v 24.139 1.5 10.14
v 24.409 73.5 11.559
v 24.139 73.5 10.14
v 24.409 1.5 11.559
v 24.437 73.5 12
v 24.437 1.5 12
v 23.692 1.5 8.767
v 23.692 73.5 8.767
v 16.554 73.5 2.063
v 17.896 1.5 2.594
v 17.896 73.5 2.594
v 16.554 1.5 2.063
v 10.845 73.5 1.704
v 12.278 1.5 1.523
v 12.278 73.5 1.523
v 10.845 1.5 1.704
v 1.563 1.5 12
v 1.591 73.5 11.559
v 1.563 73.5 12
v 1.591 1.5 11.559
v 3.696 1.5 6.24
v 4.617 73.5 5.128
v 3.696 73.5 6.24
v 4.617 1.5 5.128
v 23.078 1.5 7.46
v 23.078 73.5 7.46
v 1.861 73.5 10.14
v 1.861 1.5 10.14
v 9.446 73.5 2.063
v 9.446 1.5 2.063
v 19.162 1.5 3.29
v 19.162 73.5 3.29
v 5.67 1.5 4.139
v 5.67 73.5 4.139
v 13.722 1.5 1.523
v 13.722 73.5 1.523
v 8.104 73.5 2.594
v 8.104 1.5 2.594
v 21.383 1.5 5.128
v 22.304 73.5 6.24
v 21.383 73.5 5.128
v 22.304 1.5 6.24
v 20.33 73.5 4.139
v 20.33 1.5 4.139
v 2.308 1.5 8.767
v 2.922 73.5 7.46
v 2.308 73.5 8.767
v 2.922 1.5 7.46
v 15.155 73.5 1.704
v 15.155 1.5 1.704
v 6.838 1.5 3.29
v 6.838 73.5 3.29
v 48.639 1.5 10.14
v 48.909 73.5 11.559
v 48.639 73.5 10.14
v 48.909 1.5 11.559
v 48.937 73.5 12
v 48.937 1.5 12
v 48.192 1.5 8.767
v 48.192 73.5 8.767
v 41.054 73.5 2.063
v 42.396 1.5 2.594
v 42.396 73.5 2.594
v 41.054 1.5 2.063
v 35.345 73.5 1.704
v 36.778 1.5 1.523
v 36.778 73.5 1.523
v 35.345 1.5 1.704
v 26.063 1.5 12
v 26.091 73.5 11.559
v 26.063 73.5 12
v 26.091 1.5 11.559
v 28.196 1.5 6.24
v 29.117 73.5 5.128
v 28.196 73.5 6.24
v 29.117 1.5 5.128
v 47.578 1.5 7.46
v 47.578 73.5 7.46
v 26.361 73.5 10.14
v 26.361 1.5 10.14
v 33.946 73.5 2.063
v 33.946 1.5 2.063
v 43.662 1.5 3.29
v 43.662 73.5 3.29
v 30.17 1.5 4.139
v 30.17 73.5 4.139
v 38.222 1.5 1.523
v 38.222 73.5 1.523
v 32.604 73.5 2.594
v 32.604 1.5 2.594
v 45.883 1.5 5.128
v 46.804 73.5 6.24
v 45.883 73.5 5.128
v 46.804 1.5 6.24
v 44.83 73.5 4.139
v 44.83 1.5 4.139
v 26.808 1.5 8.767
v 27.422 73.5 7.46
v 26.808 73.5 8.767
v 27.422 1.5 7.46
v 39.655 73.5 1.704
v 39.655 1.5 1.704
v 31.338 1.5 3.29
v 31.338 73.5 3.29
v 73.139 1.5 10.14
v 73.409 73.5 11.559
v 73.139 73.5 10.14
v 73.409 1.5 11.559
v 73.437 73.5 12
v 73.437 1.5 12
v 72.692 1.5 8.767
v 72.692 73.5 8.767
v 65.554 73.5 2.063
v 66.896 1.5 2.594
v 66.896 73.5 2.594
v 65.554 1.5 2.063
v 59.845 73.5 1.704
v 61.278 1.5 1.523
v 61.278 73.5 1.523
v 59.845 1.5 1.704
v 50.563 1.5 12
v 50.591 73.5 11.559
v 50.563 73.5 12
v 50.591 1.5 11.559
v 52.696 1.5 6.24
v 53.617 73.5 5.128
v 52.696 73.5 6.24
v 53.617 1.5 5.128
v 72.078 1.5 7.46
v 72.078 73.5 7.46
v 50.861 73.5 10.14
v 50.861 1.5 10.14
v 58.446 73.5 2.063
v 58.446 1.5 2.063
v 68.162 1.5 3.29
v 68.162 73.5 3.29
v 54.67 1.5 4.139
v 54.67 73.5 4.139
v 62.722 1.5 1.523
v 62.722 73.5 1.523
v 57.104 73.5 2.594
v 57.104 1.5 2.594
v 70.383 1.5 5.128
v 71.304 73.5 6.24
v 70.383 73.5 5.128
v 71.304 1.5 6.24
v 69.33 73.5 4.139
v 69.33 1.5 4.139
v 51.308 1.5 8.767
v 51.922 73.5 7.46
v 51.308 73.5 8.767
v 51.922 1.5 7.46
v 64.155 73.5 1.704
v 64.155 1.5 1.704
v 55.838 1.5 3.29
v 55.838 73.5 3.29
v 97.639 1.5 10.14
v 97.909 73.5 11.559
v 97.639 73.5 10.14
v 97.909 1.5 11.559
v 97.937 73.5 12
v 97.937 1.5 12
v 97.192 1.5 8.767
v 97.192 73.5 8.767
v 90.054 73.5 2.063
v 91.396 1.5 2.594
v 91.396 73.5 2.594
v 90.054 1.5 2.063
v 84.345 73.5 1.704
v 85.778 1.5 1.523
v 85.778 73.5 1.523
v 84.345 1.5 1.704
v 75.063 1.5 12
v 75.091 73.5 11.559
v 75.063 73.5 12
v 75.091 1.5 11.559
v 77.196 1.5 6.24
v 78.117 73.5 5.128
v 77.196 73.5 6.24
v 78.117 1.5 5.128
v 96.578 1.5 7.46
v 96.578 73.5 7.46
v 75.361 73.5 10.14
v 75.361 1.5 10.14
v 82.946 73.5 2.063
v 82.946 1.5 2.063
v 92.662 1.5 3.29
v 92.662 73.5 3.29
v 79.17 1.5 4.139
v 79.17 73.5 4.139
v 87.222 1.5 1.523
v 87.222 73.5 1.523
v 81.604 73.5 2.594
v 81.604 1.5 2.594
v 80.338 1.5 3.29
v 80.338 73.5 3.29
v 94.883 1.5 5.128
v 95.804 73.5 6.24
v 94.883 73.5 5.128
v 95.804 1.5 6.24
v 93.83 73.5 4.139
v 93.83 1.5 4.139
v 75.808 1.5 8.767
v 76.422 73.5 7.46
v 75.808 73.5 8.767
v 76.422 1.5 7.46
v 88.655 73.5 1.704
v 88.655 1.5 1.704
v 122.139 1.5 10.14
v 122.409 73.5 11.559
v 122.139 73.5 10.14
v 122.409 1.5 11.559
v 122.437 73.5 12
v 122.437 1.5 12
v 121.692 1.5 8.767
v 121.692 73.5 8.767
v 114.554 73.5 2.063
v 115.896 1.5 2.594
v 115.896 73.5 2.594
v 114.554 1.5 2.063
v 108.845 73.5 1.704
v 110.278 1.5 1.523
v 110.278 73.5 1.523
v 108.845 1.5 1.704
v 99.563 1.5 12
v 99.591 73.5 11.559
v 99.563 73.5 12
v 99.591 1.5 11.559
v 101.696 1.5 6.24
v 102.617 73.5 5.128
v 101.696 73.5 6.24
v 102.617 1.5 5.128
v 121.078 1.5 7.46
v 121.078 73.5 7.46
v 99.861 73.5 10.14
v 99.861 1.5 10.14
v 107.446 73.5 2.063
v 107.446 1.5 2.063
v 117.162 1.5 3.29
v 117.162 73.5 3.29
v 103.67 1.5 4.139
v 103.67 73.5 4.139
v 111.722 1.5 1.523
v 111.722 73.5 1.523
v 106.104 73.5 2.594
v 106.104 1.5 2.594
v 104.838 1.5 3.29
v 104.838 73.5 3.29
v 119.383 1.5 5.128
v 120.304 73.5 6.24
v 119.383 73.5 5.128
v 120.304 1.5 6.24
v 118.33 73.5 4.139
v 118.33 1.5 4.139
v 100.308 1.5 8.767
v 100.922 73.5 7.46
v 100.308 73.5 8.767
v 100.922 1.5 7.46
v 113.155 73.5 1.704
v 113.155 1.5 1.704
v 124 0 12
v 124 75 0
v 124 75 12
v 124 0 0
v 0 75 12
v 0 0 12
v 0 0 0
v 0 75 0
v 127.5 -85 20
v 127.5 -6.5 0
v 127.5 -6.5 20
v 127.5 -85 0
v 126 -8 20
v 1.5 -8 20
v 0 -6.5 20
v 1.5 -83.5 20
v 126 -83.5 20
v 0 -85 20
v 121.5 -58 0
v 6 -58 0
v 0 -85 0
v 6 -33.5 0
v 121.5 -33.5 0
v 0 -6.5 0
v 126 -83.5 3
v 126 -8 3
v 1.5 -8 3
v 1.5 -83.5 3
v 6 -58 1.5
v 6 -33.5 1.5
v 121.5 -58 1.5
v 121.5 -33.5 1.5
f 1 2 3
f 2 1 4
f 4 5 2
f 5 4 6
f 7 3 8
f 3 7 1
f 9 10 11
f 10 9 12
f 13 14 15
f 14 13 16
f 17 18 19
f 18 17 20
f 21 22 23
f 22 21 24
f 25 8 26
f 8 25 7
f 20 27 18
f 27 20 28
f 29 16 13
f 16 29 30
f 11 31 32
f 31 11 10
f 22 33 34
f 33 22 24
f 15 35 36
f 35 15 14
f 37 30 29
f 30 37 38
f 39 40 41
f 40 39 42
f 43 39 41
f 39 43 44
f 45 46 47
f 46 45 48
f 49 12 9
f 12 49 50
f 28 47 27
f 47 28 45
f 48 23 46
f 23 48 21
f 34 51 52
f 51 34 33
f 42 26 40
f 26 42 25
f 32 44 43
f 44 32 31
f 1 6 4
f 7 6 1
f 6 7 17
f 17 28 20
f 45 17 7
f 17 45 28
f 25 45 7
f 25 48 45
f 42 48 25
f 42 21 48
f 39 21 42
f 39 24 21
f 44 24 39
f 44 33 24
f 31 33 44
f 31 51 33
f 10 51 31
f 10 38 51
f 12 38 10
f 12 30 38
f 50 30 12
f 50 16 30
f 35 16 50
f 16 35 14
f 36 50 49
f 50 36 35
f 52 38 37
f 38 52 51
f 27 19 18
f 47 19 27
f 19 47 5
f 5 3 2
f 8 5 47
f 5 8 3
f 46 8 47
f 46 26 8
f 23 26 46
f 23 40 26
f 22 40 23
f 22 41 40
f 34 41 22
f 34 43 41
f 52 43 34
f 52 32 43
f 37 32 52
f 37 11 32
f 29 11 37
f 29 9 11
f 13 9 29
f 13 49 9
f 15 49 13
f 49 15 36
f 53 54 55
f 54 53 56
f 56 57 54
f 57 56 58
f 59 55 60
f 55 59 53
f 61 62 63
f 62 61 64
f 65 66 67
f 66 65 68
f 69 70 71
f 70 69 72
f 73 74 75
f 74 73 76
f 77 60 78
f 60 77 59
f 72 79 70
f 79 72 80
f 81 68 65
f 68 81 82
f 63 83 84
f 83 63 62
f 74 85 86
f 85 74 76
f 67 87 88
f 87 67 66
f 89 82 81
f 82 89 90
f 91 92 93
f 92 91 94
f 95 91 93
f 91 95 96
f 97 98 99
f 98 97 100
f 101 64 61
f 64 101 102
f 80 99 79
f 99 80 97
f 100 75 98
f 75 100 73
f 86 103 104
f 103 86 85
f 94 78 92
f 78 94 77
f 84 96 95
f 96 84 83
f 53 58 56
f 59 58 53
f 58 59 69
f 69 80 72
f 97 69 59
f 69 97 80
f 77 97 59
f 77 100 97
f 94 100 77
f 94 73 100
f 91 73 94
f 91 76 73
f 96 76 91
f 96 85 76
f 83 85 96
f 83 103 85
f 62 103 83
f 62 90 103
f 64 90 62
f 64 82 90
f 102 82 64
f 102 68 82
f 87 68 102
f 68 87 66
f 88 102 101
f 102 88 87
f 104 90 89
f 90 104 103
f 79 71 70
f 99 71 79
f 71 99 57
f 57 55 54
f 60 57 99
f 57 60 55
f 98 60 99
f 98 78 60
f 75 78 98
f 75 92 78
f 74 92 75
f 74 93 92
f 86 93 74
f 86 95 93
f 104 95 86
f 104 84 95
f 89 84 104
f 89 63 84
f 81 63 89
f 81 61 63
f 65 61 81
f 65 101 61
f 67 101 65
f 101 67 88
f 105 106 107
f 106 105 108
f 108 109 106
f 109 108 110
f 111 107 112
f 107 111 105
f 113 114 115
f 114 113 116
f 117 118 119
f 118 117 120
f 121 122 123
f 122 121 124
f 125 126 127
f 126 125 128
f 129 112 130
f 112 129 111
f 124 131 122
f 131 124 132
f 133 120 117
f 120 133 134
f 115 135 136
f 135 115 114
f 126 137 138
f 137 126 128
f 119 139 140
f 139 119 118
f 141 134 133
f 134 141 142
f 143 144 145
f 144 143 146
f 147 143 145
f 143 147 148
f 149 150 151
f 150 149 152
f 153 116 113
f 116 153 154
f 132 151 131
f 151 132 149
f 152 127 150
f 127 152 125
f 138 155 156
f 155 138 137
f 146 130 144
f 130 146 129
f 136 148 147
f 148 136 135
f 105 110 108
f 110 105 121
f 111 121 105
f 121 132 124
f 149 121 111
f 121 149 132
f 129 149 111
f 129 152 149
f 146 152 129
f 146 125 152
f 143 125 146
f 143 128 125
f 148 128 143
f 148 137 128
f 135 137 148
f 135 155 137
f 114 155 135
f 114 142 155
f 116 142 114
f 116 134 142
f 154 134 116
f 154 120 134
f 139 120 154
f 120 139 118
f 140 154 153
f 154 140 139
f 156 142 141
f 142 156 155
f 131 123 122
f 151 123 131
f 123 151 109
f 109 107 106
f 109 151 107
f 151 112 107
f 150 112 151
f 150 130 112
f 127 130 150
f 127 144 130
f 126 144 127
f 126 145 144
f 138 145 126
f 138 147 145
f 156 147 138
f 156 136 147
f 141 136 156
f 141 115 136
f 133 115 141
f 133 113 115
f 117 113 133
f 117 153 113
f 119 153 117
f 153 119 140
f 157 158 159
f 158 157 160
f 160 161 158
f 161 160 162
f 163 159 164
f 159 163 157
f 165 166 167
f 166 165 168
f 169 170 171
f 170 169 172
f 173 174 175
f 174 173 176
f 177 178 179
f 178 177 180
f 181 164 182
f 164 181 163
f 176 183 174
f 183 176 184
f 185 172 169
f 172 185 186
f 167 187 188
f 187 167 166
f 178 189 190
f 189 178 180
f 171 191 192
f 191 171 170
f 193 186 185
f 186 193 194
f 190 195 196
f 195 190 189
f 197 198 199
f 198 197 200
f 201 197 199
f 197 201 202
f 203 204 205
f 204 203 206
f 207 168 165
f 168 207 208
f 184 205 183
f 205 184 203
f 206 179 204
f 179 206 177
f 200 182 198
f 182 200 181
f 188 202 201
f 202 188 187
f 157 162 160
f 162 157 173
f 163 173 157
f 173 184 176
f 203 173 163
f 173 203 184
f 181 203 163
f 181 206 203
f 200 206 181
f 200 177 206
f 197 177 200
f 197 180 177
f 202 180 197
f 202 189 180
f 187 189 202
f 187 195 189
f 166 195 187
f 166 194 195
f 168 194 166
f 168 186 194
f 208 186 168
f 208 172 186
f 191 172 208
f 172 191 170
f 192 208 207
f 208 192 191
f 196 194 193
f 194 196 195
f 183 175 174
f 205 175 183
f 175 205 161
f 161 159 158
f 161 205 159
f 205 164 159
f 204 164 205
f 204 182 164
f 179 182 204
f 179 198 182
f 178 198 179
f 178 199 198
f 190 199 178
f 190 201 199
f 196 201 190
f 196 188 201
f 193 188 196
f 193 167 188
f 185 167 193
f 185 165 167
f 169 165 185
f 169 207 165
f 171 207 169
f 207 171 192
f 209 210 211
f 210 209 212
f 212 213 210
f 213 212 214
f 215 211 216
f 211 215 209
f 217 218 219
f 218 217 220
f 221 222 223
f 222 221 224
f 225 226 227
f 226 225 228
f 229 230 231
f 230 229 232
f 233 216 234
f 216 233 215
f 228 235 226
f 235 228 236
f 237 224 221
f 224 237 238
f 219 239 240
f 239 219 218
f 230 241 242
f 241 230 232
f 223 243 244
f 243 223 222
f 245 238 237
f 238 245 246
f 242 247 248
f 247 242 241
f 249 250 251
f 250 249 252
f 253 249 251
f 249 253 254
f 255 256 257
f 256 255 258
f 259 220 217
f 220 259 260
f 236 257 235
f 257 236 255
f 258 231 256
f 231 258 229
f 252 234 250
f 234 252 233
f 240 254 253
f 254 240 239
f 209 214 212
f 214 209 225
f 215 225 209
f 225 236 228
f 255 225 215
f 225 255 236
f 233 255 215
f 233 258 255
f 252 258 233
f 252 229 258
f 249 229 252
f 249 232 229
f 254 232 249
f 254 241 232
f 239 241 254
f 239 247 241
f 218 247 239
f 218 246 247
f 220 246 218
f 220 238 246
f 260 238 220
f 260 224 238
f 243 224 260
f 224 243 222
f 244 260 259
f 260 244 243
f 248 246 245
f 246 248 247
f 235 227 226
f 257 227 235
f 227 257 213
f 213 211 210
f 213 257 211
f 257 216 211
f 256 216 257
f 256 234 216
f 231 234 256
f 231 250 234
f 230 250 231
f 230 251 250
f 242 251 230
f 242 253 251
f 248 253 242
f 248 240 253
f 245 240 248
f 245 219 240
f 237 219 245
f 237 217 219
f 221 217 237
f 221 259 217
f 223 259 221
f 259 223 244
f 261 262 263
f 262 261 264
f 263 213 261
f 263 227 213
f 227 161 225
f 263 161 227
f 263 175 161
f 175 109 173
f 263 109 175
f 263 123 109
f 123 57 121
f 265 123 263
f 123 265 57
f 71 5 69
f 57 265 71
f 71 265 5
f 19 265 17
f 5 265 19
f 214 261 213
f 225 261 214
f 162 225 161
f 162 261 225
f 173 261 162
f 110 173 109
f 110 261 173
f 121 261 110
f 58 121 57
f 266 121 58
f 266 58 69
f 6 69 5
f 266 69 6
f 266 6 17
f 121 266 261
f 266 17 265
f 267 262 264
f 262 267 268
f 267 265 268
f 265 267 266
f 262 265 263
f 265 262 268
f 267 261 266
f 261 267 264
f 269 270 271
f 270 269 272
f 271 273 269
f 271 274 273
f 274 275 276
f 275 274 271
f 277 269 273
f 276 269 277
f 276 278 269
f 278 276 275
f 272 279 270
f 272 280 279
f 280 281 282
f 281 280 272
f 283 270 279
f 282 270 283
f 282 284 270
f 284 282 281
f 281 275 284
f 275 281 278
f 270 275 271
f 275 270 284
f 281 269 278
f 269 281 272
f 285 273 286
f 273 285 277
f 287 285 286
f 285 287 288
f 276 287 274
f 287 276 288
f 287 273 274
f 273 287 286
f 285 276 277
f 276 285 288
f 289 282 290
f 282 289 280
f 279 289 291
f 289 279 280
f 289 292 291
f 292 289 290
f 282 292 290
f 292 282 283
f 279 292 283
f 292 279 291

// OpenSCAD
choke_len = 72.0; // 90.0
choke_d = 23.0; // 22.0
choke_space = 1.5;

box_height = 12.0; // 15.0
wall_thick = 1.5;
spacer = 0.25; // 0.50

box_outer_l = 2 * wall_thick + 5 * choke_d + 4 * choke_space;
box_outer_w = choke_len + 2*wall_thick;

$fn = 50;

// ------ Choker Holder Bottom ----------
union(){
    difference(){
        cube([box_outer_l, box_outer_w, box_height], center = false);
        for (i = [0 : 4]){
            translate([wall_thick + choke_d / 2.0 + i * (choke_d + choke_space), wall_thick, wall_thick + choke_d / 2.0]){
                rotate([-90, 0, 0]) {
                    cylinder(h = choke_len, r = choke_d / 2.0, center = false);
                }
            }
        }
    }
}

offset_w = -85.0;
x_inset_border = 6.0;
y_inset_border = 27.0;

// ------ Box Top ----------
union() {
    difference(){
        translate([0, offset_w, 0]) {
            cube([box_outer_l + 2 * wall_thick + 2 * spacer,
                  box_outer_w + 2 * wall_thick + 2 * spacer,
                  box_height + 8.0], center = false);
        }
        translate([wall_thick, offset_w + wall_thick, 2*wall_thick]){
            cube([box_outer_l + 2 * spacer,
                  box_outer_w + 2 * spacer,
                  box_height + 10.0], center = false);
        }
        translate([x_inset_border, 
                   offset_w + box_outer_w + 2 * wall_thick + 2 * spacer - y_inset_border, 
                   wall_thick]) {
            rotate([180, 0, 0])
            cube([box_outer_l + 2 * wall_thick + 2 * spacer - 2 * x_inset_border, 
                  box_outer_w + 2 * wall_thick + 2 * spacer - 2 * y_inset_border, 
                  10], center = false);
        }
    }
    translate([(box_outer_l + 2 * wall_thick + 2 * spacer) / 2.0, 
                offset_w + (box_outer_w + 2*wall_thick + 2*spacer) / 2.0, 
                0]) {
        rotate([180, 0, 0])
        //color("green")
        // .1 is too much, 0.05, 0.06 not enough, 0.07 no, 0.08 no, 0.09 no
        //scale([.2, .2, 0.07])
        // pixels are 463 x 100
        resize([115.75, 25, wall_thick+0.5])
            surface("c:/repositories/3d-modeling/beretta-png-logo-smaller.png", 
                    center = true, invert = true);
    }
}
